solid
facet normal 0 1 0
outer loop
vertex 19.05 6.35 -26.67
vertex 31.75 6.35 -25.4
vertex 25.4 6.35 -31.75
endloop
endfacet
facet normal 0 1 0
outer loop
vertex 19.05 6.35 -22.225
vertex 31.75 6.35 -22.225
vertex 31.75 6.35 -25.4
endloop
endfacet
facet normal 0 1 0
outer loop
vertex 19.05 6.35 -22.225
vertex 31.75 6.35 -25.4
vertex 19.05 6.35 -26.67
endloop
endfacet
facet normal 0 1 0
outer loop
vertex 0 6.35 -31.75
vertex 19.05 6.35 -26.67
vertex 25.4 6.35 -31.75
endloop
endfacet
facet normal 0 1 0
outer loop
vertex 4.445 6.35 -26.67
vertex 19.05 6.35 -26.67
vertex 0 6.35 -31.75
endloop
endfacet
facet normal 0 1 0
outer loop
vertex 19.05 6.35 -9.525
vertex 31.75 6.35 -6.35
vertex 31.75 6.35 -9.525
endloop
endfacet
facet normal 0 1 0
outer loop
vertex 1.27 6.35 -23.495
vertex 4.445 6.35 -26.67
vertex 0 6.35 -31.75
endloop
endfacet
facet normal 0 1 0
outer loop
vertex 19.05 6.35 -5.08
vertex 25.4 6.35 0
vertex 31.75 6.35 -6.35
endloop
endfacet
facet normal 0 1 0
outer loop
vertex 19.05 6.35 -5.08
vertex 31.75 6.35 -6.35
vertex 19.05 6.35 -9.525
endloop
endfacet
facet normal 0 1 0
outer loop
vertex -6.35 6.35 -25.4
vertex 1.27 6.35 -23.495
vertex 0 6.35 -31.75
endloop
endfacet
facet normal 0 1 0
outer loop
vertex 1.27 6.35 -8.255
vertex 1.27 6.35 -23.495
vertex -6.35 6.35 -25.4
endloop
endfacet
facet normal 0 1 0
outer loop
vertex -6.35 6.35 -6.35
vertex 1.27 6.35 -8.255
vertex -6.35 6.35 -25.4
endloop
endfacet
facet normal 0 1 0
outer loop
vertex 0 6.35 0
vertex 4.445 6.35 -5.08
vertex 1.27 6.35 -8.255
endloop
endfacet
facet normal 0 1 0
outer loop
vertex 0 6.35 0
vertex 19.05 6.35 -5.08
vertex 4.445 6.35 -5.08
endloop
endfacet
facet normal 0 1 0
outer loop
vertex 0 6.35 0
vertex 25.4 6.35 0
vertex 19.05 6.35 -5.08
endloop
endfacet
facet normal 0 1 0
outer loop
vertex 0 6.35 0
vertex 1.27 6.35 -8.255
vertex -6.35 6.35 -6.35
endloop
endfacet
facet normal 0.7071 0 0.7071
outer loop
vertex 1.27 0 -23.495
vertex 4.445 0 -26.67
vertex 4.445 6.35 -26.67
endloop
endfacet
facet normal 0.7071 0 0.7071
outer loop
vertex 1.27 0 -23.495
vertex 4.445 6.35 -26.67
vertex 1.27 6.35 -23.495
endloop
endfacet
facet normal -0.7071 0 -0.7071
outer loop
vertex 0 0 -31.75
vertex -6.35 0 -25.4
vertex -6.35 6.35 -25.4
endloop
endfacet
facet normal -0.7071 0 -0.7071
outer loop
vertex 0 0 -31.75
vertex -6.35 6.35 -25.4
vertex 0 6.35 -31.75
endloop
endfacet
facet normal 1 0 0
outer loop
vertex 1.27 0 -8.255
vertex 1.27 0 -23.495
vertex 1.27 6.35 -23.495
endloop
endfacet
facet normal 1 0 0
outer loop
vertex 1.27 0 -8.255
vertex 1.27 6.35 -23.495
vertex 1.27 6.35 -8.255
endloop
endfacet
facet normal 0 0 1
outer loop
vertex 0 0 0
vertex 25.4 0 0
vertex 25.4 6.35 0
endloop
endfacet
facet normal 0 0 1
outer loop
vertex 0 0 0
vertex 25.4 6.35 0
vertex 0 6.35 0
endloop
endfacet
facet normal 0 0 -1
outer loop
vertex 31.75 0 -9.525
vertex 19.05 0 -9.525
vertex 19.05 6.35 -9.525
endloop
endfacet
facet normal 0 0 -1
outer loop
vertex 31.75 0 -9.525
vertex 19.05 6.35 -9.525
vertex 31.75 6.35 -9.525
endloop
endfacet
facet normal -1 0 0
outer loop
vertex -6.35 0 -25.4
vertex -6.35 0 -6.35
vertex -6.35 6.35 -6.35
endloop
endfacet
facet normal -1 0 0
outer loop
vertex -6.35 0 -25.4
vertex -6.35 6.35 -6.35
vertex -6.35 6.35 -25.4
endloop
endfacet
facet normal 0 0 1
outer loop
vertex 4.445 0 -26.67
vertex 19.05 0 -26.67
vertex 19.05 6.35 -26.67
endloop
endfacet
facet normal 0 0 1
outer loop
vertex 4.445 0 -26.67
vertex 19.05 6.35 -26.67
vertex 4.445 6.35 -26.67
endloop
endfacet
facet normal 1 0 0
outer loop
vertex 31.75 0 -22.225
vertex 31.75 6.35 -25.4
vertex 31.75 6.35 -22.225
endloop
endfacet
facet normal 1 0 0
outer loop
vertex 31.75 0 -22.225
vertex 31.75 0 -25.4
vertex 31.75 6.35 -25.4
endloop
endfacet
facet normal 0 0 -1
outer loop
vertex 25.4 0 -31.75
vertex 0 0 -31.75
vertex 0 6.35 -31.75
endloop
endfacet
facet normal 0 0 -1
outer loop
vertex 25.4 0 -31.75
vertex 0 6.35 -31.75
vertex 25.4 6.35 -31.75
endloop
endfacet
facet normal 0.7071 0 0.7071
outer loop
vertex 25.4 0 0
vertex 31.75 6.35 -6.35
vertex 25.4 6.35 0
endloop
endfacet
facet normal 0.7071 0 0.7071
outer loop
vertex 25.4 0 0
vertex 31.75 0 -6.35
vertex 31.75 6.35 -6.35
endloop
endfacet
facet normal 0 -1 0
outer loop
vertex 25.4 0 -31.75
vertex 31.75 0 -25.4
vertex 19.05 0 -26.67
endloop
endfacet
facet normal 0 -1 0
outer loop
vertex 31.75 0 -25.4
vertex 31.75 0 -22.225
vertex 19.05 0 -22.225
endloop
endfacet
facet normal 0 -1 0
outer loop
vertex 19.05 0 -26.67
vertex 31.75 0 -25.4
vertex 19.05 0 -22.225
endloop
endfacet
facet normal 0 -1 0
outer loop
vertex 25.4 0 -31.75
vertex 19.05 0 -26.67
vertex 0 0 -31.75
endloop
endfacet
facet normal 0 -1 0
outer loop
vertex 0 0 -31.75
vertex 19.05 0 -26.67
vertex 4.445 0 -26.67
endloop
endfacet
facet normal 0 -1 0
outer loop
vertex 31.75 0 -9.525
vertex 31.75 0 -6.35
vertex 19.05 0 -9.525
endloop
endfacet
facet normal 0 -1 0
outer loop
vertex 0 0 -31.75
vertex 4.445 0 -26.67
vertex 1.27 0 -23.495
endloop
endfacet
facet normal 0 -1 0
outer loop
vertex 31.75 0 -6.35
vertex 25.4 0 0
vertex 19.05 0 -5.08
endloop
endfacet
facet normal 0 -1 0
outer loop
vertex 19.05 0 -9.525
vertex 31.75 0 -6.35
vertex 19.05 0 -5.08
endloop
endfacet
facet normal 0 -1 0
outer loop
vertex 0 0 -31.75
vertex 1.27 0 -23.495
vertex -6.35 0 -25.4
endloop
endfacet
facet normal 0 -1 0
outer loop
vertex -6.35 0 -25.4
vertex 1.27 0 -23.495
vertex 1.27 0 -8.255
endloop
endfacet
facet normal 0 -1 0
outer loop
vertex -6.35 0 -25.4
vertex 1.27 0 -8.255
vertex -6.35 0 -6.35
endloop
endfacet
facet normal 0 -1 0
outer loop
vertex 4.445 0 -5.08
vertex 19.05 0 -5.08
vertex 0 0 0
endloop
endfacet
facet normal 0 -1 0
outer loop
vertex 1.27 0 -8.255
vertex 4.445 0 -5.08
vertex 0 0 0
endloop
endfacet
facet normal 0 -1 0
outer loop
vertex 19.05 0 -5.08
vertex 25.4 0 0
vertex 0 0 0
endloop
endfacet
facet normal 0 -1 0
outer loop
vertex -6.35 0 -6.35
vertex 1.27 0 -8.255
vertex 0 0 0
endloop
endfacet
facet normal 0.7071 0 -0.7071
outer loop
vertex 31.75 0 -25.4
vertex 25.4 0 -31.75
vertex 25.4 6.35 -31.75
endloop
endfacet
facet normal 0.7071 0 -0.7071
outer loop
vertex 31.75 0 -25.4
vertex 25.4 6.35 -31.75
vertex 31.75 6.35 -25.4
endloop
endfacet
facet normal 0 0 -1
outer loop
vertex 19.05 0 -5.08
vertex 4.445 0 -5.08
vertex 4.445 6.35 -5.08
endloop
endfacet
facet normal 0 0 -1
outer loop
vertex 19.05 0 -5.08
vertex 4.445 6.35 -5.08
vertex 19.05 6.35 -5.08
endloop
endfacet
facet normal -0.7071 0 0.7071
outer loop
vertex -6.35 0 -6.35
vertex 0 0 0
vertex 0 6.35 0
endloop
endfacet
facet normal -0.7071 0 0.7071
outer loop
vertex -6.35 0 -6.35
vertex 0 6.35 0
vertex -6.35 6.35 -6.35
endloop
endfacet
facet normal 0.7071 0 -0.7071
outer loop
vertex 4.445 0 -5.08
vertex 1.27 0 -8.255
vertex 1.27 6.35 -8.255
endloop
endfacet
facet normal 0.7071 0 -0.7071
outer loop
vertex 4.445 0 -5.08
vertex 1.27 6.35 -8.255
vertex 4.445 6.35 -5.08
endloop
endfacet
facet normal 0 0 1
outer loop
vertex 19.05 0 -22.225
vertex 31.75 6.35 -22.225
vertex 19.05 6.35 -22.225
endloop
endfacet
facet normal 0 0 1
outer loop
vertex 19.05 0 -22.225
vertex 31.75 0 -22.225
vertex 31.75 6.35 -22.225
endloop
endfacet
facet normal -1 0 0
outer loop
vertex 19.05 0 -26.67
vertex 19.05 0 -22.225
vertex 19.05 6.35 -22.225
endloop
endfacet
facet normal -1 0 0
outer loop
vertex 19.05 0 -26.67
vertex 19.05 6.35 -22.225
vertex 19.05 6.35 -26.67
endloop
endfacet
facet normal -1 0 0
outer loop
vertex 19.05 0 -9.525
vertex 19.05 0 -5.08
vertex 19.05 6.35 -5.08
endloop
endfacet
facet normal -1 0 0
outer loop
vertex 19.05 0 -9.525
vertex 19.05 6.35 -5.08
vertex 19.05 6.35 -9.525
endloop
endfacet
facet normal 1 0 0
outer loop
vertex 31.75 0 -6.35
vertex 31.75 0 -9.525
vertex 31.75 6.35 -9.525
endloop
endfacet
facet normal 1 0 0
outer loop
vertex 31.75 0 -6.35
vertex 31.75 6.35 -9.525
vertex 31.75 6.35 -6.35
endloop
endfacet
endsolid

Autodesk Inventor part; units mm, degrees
ref_plane "YZ Plane" through (0, 0, 0) normal (1, 0, 0) x (0, 1, 0)
ref_plane "XZ Plane" through (0, 0, 0) normal (0, 1, 0) x (-1, 0, 0)
ref_plane "XY Plane" through (0, 0, 0) normal (0, 0, 1) x (1, 0, 0)
sketch "Sketch1" plane through (0, 0, 0) normal (0, 1, 0) x (-1, 0, 0)
  line L0 (0, 0) -> (6.35, -6.35)
  line L1 (6.35, -6.35) -> (6.35, -25.4)
  line L2 (6.35, -25.4) -> (0, -31.75)
  line L3 (0, -31.75) -> (-25.4, -31.75)
  line L4 (-25.4, -31.75) -> (-31.75, -25.4)
  line L5 (-31.75, -25.4) -> (-31.75, -22.225)
  line L6 (-31.75, -22.225) -> (-19.05, -22.225)
  line L7 (-19.05, -22.225) -> (-19.05, -26.67)
  line L8 (-19.05, -26.67) -> (-4.445, -26.67)
  line L9 (-4.445, -26.67) -> (-1.27, -23.495)
  line L10 (-1.27, -23.495) -> (-1.27, -8.255)
  line L11 (-1.27, -8.255) -> (-4.445, -5.08)
  line L12 (-4.445, -5.08) -> (-19.05, -5.08)
  line L13 (-19.05, -5.08) -> (-19.05, -9.525)
  line L14 (-19.05, -9.525) -> (-31.75, -9.525)
  line L15 (-31.75, -9.525) -> (-31.75, -6.35)
  line L16 (-31.75, -6.35) -> (-25.4, 0)
  line L17 (-25.4, 0) -> (0, 0)
  dimension "d0" = 45
  dimension "d1" = 38.1
  dimension "d2" = 31.75
  dimension "d3" = 9.525
  dimension "d4" = 5.08
  dimension "d5" = 12.7
  dimension "d6" = 5.08
  dimension "d7" = 3.175
  dimension "d8" = 7.62
  dimension "d9" = 6.35
  dimension "d10" = 31.75
  dimension "d11" = 12.7
extrude "Extrusion1" add sketch "Sketch1" along normal blind 6.35
properties part number "C-Clip"
